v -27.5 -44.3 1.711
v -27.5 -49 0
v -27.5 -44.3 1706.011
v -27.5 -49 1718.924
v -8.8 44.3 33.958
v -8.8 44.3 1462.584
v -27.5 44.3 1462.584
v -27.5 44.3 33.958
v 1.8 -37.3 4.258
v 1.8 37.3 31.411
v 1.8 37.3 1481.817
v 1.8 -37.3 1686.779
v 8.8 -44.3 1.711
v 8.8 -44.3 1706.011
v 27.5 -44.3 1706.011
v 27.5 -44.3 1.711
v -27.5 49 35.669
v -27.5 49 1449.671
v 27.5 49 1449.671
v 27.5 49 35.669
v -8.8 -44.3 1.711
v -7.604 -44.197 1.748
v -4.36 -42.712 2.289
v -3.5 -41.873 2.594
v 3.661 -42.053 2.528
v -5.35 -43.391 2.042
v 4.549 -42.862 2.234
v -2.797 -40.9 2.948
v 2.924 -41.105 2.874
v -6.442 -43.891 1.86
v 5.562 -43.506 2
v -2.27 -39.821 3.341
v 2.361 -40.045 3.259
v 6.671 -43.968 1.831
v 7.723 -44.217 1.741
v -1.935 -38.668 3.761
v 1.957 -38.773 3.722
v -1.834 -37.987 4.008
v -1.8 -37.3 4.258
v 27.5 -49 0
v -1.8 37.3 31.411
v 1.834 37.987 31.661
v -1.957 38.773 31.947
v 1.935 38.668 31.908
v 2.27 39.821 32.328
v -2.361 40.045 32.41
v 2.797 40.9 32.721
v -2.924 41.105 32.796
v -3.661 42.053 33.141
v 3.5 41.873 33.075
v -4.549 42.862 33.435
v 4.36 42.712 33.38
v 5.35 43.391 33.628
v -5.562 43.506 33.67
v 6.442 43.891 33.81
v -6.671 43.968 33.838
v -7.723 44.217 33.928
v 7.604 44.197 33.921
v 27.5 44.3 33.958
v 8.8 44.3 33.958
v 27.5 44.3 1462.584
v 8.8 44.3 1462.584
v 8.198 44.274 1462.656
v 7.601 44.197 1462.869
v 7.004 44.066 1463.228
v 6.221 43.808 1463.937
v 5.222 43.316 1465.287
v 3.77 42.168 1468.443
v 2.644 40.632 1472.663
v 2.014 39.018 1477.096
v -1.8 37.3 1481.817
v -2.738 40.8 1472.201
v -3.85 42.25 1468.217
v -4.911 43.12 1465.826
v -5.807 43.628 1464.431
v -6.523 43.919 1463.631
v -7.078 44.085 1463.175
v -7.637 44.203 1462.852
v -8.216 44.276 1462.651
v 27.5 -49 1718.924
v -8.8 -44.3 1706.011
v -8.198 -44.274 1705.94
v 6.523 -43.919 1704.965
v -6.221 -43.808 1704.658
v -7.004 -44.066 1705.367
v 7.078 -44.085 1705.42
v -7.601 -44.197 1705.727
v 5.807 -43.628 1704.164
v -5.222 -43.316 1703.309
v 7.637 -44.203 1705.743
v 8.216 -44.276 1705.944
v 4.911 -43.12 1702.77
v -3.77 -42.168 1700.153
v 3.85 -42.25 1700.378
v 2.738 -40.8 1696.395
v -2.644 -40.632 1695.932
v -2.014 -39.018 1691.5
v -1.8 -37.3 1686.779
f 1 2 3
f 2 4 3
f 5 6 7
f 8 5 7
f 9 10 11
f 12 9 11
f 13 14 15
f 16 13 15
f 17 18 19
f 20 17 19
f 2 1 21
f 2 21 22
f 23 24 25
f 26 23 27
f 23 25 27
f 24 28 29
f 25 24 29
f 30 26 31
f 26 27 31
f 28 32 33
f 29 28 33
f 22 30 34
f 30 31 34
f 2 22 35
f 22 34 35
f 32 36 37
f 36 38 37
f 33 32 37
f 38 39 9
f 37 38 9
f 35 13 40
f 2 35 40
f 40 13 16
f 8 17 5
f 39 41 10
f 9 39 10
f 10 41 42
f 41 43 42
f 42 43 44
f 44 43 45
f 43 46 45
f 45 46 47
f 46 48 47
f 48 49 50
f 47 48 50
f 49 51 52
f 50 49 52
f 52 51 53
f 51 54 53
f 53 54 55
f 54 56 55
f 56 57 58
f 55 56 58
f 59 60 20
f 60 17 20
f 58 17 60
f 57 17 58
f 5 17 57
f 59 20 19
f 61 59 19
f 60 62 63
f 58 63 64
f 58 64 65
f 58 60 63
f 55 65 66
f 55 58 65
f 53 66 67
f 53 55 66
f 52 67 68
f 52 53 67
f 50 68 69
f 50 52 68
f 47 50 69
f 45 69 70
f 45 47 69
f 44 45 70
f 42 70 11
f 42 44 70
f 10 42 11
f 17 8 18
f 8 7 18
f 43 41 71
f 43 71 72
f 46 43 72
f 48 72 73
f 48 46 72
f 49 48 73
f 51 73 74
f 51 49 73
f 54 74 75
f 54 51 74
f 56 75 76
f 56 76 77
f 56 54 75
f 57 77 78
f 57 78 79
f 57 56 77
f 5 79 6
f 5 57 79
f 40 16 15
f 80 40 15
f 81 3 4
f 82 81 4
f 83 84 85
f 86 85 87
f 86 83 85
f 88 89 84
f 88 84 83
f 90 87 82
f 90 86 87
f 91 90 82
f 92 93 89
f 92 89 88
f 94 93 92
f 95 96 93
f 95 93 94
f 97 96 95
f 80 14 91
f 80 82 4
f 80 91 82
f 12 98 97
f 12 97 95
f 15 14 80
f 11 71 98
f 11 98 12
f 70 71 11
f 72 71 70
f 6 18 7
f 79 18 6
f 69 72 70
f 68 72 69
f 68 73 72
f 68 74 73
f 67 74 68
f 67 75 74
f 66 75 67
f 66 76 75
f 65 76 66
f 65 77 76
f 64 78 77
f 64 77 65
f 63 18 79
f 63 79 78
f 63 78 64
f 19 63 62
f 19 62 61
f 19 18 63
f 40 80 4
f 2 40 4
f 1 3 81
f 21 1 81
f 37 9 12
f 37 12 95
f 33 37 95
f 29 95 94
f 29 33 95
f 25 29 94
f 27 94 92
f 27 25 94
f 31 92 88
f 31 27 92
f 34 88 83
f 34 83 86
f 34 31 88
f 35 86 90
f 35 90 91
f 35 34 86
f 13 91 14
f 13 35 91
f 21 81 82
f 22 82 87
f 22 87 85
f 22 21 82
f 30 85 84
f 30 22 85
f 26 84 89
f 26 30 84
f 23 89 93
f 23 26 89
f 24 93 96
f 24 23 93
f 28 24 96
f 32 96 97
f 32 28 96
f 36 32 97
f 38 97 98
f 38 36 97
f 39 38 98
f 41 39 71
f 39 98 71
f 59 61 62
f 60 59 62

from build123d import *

# Parameters (mm, degrees)
BOSS_EXTRUDE1_DEPTH     = 1726.350547376
SKETCH2_W               = 211.702458594
SKETCH2_H               = 483.586926944
CUT_EXTRUDE1_DEPTH      = 34.517974046
SKETCH3_W               = 200.611820877
SKETCH3_H               = 857.421683483
CUT_EXTRUDE3_DEPTH      = 93.089876837
CUT_EXTRUDE3_DEPTH_BACK = 2.54


with BuildPart() as part:
    # Sketch1 → Boss-Extrude1 (new body)
    with BuildSketch(Plane.XY):
        with BuildLine():
            Line((-27.5, 49), (27.5, 49))
            Line((27.5, 49), (27.5, 44.3))
            Line((27.5, 44.3), (8.8, 44.3))
            ThreePointArc((8.8, 44.3), (3.850252532, 42.249747468), (1.8, 37.3))
            Line((1.8, 37.3), (1.8, -37.3))
            ThreePointArc((1.8, -37.3), (3.850252532, -42.249747468), (8.8, -44.3))
            Line((8.8, -44.3), (27.5, -44.3))
            Line((27.5, -44.3), (27.5, -49))
            Line((27.5, -49), (-27.5, -49))
            Line((-27.5, -49), (-27.5, -44.3))
            Line((-27.5, -44.3), (-8.8, -44.3))
            ThreePointArc((-8.8, -44.3), (-3.850252532, -42.249747468), (-1.8, -37.3))
            Line((-1.8, -37.3), (-1.8, 37.3))
            ThreePointArc((-1.8, 37.3), (-3.850252532, 42.249747468), (-8.8, 44.3))
            Line((-8.8, 44.3), (-27.5, 44.3))
            Line((-27.5, 44.3), (-27.5, 49))
        make_face()
    extrude(amount=BOSS_EXTRUDE1_DEPTH)

    # Sketch2 → Cut-Extrude1 (cut, through all)
    with BuildSketch(Plane(origin=(0, -5.731911144, 15.748296437), x_dir=(1, 0, 0), z_dir=(0, -0.342020143, 0.939692621))):
        with Locations((0, 13.030857736)):
            Rectangle(SKETCH2_W, SKETCH2_H)
    extrude(amount=-CUT_EXTRUDE1_DEPTH, mode=Mode.SUBTRACT)

    # Sketch3 → Cut-Extrude3 (cut, two sides)
    with BuildSketch(Plane(origin=(0, 511.570282058, 186.196355404), x_dir=(1, 0, 0), z_dir=(0, 0.939692621, 0.342020143))) as cut_extrude3_sk:
        with Locations((34.7211676, -1334.740482361)):
            Rectangle(SKETCH3_W, SKETCH3_H)
    extrude(amount=CUT_EXTRUDE3_DEPTH, mode=Mode.SUBTRACT)
    extrude(cut_extrude3_sk.sketch, amount=-CUT_EXTRUDE3_DEPTH_BACK, mode=Mode.SUBTRACT)


solid = part.part
